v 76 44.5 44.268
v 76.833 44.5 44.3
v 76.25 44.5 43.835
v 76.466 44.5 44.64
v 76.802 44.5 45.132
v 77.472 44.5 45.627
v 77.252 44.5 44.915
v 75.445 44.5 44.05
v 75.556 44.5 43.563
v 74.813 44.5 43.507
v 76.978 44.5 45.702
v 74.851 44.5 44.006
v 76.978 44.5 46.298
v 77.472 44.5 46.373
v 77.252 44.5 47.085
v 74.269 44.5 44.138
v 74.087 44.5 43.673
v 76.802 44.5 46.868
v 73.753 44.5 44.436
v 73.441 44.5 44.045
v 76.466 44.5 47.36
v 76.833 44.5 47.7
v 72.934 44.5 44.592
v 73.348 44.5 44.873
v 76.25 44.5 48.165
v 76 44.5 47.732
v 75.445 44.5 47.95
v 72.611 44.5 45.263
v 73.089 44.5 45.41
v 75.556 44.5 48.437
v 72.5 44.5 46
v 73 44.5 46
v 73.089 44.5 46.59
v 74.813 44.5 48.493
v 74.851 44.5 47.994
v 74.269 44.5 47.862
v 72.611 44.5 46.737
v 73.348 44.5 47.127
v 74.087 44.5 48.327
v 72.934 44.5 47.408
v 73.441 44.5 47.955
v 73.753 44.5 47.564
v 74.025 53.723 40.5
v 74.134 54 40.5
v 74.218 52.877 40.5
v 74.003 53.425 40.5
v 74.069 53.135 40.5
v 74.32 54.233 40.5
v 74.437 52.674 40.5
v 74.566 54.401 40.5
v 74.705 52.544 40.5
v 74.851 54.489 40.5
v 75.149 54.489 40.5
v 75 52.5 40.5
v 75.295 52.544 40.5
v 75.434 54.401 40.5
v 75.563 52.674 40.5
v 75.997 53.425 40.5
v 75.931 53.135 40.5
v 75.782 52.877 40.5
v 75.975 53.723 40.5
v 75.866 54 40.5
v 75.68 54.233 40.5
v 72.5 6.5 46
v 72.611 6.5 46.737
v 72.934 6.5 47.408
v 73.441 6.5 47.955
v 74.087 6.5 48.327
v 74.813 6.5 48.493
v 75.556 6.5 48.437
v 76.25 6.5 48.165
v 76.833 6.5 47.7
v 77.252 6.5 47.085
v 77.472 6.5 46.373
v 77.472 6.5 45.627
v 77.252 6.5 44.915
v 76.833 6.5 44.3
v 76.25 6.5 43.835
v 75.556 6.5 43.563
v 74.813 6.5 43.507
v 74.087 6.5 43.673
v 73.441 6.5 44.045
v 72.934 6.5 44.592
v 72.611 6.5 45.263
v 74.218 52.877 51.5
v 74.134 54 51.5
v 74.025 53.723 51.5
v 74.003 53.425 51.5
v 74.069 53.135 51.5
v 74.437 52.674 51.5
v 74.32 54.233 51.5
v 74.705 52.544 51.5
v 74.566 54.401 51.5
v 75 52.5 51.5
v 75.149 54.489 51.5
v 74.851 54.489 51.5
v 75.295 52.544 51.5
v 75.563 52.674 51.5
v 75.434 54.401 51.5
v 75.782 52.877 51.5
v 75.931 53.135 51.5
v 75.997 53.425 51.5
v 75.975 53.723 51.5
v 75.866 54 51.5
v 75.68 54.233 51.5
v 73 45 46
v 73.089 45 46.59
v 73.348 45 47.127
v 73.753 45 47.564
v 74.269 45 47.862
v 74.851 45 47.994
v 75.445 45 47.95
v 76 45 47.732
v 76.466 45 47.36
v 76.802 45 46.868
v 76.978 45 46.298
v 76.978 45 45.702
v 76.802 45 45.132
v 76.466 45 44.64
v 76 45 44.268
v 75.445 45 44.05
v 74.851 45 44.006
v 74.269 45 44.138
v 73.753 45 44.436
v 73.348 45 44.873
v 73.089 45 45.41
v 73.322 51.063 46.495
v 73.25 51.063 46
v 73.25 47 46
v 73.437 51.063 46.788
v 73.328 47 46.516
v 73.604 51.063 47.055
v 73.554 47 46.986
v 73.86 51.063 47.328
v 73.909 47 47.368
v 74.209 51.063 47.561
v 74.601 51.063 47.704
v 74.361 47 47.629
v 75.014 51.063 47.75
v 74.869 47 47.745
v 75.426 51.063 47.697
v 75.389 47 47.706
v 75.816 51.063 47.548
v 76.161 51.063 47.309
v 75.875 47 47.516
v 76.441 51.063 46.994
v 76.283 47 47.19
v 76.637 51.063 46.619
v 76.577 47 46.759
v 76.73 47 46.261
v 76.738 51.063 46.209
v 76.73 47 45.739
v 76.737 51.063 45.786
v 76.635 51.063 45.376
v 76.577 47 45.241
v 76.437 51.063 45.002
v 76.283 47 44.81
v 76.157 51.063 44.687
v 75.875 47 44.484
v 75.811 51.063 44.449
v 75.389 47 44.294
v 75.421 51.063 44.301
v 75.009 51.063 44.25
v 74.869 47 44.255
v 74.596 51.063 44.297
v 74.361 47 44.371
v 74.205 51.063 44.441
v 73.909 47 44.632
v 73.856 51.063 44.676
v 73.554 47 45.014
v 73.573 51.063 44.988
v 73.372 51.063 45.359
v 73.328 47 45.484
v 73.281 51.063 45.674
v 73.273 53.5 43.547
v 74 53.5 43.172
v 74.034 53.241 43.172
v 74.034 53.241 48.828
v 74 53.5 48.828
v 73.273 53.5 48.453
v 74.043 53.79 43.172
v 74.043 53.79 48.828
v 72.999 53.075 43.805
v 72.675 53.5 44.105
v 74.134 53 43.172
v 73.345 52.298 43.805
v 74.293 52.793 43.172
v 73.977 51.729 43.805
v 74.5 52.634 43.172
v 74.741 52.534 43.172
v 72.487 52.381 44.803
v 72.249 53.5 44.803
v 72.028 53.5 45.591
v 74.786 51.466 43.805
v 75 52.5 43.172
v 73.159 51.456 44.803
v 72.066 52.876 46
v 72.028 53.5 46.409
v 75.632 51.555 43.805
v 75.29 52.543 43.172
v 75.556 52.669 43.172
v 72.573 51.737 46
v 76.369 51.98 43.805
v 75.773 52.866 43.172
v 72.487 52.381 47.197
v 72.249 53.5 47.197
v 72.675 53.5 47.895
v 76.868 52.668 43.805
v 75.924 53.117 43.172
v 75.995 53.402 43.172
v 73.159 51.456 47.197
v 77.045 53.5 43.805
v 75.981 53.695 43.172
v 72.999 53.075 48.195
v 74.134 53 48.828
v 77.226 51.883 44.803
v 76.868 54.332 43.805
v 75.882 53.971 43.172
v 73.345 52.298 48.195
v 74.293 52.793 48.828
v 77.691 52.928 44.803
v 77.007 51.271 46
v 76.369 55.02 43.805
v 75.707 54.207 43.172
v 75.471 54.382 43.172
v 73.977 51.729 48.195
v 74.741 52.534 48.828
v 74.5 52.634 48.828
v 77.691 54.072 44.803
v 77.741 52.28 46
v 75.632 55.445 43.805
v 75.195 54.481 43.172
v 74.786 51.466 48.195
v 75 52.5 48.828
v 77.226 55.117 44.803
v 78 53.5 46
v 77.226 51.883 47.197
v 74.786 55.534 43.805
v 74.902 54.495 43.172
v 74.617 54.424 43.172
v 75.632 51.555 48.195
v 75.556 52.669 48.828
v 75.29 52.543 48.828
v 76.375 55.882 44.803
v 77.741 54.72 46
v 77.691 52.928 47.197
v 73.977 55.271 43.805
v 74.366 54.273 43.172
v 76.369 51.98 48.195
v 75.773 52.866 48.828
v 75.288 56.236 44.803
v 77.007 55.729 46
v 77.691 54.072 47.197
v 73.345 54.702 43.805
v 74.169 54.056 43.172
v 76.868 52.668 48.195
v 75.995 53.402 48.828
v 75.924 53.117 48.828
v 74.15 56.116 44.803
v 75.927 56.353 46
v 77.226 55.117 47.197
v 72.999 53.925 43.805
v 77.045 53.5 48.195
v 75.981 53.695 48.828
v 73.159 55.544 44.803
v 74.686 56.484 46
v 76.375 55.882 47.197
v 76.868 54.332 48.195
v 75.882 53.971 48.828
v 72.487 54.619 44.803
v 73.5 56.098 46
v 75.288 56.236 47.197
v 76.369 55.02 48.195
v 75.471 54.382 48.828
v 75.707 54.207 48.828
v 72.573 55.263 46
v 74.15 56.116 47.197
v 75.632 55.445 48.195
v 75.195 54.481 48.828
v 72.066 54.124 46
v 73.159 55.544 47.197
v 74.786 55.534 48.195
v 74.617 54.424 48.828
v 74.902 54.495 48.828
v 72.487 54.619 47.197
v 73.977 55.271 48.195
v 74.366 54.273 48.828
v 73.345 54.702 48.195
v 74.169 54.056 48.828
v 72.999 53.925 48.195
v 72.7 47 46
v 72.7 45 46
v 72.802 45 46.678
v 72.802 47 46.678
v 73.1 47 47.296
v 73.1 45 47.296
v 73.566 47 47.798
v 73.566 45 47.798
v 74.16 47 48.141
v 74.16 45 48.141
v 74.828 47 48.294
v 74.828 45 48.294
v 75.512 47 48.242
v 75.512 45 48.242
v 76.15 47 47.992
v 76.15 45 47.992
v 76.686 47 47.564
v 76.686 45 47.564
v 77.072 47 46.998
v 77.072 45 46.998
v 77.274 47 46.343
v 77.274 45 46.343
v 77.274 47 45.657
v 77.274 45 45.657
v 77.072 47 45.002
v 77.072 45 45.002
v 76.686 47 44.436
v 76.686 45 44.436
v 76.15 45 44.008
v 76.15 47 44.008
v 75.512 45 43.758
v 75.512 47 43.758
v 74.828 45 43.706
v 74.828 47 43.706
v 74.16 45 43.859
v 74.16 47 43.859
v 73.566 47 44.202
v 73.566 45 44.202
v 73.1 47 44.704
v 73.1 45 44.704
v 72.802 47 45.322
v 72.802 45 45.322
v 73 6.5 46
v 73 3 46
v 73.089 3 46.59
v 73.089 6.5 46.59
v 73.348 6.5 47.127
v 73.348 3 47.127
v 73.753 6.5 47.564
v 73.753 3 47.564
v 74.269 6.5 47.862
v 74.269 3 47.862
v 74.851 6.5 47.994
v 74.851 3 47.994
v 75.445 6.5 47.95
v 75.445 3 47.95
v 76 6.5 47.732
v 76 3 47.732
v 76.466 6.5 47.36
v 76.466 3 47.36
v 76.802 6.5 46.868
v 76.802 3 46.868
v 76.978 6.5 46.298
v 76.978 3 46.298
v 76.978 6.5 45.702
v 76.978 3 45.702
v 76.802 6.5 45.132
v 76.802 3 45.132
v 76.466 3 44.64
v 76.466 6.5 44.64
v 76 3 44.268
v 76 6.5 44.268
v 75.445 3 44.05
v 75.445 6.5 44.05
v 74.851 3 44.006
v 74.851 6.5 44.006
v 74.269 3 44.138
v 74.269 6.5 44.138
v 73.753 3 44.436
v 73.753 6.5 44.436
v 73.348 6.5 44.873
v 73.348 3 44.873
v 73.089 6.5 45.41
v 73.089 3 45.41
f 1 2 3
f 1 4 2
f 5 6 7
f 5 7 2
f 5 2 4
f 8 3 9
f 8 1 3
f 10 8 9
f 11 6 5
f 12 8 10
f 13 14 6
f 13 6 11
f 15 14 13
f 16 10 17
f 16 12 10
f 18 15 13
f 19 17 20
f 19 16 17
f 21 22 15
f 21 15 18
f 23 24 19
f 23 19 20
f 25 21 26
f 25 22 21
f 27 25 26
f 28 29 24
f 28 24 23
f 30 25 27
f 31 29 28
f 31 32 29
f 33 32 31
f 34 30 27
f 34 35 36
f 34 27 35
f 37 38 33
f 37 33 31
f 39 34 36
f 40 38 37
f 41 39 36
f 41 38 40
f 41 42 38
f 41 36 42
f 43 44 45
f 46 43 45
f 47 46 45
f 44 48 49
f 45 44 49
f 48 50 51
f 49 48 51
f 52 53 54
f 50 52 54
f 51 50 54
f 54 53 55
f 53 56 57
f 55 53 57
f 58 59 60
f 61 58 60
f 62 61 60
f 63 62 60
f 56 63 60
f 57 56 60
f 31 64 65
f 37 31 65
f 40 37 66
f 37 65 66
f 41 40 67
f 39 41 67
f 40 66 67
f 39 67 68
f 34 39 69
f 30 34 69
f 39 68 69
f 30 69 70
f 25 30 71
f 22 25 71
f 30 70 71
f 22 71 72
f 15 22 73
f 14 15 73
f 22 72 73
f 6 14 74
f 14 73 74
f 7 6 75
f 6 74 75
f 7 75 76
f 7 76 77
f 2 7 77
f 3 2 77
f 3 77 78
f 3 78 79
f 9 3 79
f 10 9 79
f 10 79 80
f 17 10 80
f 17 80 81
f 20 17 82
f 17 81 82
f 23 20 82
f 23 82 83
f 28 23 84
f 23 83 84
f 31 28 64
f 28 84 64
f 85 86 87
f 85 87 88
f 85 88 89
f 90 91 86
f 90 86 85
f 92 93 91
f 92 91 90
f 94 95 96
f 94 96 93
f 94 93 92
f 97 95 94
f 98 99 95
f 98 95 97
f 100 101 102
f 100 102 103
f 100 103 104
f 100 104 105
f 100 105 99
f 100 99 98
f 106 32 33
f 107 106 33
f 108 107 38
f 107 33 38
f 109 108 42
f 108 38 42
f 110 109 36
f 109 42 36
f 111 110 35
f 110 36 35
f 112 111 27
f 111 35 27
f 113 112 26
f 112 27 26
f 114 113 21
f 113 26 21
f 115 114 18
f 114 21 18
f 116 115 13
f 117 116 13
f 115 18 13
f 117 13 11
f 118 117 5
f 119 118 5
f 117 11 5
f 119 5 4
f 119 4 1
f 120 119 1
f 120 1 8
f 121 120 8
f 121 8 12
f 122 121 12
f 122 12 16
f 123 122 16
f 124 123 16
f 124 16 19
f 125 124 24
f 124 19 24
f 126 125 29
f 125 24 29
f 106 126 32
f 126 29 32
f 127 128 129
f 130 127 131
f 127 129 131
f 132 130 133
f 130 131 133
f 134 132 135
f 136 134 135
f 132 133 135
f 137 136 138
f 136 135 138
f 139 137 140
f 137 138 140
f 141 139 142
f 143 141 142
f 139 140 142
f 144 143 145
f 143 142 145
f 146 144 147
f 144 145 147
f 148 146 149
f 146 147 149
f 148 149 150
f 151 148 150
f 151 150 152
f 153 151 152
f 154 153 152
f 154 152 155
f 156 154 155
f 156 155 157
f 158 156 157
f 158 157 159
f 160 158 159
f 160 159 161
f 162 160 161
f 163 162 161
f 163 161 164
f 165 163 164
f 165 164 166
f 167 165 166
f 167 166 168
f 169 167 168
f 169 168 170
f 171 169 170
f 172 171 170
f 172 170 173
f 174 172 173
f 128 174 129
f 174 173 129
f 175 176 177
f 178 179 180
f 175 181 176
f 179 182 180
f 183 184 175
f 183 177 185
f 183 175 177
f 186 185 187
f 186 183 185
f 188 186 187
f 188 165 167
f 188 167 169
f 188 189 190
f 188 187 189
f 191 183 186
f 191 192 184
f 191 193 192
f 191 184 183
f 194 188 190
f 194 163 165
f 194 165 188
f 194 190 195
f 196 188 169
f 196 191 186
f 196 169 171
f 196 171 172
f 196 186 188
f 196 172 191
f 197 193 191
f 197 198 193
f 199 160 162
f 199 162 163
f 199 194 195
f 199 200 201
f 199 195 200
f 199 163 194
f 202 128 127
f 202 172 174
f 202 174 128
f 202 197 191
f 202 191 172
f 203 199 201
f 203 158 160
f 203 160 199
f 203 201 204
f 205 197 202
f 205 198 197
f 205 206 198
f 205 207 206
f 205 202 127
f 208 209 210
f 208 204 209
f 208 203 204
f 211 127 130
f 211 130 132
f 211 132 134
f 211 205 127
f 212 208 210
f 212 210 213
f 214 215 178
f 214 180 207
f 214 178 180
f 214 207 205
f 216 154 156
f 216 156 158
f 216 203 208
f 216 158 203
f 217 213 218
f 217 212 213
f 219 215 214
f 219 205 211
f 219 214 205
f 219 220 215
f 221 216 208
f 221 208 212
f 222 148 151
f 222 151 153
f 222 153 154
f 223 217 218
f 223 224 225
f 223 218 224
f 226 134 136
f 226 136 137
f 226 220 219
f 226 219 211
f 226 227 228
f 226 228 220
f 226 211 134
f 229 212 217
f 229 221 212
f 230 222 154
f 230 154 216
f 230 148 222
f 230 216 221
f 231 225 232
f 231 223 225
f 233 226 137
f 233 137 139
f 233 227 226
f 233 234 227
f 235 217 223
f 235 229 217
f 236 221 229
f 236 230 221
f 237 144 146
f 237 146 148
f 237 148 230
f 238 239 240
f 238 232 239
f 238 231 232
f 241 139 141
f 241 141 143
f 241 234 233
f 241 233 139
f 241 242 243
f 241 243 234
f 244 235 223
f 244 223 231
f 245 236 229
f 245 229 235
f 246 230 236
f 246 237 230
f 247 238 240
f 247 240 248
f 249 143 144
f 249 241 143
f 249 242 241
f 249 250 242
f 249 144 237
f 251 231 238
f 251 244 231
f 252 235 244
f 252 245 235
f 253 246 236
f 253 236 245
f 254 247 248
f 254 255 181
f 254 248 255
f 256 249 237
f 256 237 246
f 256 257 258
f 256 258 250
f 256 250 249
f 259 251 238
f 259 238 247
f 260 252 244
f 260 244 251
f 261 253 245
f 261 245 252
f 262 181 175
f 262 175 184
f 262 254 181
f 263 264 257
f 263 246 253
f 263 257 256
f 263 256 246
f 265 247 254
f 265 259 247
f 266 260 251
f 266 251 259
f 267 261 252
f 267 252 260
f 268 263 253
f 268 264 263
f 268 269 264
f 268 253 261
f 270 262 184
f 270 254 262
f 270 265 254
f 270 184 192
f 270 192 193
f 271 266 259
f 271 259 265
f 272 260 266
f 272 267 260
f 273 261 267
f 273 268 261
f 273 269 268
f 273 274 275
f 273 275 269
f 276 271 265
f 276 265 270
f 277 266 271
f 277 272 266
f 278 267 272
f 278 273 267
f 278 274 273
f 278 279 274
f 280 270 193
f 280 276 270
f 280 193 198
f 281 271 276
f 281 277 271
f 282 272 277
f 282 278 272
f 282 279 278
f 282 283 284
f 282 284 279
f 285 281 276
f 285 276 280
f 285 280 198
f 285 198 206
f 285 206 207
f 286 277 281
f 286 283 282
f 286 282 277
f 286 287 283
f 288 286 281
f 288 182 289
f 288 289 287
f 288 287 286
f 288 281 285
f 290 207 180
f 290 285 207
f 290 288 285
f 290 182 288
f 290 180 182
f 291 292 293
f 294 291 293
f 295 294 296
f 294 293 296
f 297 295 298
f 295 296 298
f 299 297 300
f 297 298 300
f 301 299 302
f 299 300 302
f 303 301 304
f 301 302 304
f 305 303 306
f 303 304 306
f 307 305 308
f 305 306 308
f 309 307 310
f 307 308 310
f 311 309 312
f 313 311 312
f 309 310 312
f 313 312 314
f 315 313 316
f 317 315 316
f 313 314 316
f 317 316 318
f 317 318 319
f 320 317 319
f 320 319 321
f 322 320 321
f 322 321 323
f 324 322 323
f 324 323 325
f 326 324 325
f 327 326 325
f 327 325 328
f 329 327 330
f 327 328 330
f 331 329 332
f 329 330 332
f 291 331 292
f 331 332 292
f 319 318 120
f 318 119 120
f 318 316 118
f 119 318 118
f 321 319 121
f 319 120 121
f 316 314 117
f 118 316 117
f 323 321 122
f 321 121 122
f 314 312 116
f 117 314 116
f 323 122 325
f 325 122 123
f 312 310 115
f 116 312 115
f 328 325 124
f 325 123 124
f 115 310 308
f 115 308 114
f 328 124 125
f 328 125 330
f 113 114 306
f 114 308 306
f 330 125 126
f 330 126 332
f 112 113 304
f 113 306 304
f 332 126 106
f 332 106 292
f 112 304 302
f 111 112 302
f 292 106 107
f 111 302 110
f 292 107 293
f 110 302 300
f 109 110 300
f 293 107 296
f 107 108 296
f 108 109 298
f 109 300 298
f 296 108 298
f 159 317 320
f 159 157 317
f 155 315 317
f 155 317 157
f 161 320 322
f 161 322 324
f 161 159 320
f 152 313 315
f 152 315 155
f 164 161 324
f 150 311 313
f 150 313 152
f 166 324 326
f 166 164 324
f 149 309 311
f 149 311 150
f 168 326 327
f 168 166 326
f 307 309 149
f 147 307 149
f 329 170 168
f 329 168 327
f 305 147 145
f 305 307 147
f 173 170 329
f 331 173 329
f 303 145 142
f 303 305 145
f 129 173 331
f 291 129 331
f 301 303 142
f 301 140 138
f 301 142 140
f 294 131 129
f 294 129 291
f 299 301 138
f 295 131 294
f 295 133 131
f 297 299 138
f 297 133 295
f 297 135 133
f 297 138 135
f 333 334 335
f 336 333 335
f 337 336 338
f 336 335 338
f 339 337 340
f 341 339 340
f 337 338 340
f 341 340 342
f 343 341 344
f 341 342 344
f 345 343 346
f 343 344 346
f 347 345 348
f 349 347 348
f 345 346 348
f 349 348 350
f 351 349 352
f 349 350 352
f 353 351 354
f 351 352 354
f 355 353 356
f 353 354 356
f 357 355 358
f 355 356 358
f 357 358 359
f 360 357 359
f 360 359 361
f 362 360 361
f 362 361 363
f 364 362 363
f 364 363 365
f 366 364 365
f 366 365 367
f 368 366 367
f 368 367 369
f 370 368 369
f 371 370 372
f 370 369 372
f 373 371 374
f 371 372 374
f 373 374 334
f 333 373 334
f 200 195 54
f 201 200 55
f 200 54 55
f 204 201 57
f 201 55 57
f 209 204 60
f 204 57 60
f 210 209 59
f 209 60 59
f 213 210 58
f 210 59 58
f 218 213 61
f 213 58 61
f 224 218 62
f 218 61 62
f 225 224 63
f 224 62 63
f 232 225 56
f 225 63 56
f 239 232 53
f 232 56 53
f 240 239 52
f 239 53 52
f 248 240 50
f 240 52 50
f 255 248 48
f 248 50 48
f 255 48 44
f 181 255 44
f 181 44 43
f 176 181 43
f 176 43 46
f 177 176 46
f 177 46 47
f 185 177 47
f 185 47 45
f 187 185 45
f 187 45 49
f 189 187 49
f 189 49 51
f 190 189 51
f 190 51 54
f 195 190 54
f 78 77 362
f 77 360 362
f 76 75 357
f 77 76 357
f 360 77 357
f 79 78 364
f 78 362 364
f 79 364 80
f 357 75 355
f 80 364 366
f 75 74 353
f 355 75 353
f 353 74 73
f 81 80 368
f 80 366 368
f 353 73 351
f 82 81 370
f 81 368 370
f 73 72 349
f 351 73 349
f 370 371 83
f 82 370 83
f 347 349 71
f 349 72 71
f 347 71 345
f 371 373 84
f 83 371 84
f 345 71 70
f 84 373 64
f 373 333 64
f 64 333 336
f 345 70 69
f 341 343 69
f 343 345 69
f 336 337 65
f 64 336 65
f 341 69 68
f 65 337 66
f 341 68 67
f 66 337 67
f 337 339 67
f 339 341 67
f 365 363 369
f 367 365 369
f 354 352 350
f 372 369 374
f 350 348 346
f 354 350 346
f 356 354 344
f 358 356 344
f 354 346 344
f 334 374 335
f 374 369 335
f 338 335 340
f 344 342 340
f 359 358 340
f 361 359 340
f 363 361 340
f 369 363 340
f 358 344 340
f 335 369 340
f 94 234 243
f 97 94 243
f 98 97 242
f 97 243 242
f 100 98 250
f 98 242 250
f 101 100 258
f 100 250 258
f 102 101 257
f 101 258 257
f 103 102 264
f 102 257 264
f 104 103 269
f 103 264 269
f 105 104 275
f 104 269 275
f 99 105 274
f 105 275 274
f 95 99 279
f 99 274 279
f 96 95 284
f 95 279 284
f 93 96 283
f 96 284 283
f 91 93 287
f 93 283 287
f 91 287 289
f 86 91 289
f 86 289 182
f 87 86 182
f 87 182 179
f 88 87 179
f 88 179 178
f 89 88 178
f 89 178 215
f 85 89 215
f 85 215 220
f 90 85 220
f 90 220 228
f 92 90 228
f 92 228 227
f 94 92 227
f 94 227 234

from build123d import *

# Parameters (mm, degrees)
CYLINDER830_R                                           = 2.5
CYLINDER830_DEPTH                                       = 38
CYLINDER832_R                                           = 2.3
CYLINDER832_DEPTH                                       = 2
CYLINDER831_R                                           = 2
CYLINDER831_DEPTH                                       = 0.5
CYLINDER833_R                                           = 1.75
CYLINDER833_DEPTH                                       = 6
CYLINDER834_R                                           = 1
CYLINDER834_DEPTH                                       = 11
CYLINDER828_R                                           = 2
CYLINDER828_DEPTH                                       = 3.5
FUSION088026007031024007008004081022014_PLACEMENT_ANGLE = 180


with BuildPart() as cylinder:
    # Cylinder830 → Cylinder830 (new body)
    with BuildSketch(Plane.XZ.offset(-86.5)):
        Circle(CYLINDER830_R)
    extrude(amount=CYLINDER830_DEPTH)


with BuildPart() as cylinder832:
    # Cylinder832 → Cylinder832 (new body)
    with BuildSketch(Plane.XZ.offset(-48)):
        Circle(CYLINDER832_R)
    extrude(amount=CYLINDER832_DEPTH)


with BuildPart() as cylinder831:
    # Cylinder831 → Cylinder831 (new body)
    with BuildSketch(Plane.XZ.offset(-48.5)):
        Circle(CYLINDER831_R)
    extrude(amount=CYLINDER831_DEPTH)


with BuildPart() as sphere:
    # Sphere → Sphere (revolve)
    with BuildSketch(Plane.XZ.offset(-39.5)):
        with BuildLine():
            ThreePointArc((0, -3), (3, 0), (0, 3))
            Line((0, 3), (0, -3))
        make_face()
    revolve(axis=Axis((0, 39.5, 0), (0, 0, 1)))


with BuildPart() as cylinder833:
    # Cylinder833 → Cylinder833 (new body)
    with BuildSketch(Plane.XZ.offset(-46)):
        Circle(CYLINDER833_R)
    extrude(amount=CYLINDER833_DEPTH)


with BuildPart() as cylinder834:
    # Cylinder834 → Cylinder834 (new body)
    with BuildSketch(Plane(origin=(0, 39.5, -5.5), x_dir=(0, 1, 0), z_dir=(0, 0, 1))):
        Circle(CYLINDER834_R)
    extrude(amount=CYLINDER834_DEPTH)


with BuildPart() as axle_shaft_left:
    # Cylinder828 → Cylinder828 (new body)
    with BuildSketch(Plane.XZ.offset(-90)):
        Circle(CYLINDER828_R)
    extrude(amount=CYLINDER828_DEPTH)

    # Fusion088026007031024007008004081022014: union Cylinder, Cylinder832, Cylinder831, Sphere, Cylinder833, Cylinder834
    add(cylinder.part)
    add(cylinder832.part)
    add(cylinder831.part)
    add(sphere.part)
    add(cylinder833.part)
    add(cylinder834.part)


with BuildPart() as axle_shaft_left_1:
    # Fusion088026007031024007008004081022014 placement: moved
    add(axle_shaft_left.part.moved(Location((75, 93, 46))).rotate(Axis((75, 93, 46), (0, 0, 1)), FUSION088026007031024007008004081022014_PLACEMENT_ANGLE))


solid = axle_shaft_left_1.part
